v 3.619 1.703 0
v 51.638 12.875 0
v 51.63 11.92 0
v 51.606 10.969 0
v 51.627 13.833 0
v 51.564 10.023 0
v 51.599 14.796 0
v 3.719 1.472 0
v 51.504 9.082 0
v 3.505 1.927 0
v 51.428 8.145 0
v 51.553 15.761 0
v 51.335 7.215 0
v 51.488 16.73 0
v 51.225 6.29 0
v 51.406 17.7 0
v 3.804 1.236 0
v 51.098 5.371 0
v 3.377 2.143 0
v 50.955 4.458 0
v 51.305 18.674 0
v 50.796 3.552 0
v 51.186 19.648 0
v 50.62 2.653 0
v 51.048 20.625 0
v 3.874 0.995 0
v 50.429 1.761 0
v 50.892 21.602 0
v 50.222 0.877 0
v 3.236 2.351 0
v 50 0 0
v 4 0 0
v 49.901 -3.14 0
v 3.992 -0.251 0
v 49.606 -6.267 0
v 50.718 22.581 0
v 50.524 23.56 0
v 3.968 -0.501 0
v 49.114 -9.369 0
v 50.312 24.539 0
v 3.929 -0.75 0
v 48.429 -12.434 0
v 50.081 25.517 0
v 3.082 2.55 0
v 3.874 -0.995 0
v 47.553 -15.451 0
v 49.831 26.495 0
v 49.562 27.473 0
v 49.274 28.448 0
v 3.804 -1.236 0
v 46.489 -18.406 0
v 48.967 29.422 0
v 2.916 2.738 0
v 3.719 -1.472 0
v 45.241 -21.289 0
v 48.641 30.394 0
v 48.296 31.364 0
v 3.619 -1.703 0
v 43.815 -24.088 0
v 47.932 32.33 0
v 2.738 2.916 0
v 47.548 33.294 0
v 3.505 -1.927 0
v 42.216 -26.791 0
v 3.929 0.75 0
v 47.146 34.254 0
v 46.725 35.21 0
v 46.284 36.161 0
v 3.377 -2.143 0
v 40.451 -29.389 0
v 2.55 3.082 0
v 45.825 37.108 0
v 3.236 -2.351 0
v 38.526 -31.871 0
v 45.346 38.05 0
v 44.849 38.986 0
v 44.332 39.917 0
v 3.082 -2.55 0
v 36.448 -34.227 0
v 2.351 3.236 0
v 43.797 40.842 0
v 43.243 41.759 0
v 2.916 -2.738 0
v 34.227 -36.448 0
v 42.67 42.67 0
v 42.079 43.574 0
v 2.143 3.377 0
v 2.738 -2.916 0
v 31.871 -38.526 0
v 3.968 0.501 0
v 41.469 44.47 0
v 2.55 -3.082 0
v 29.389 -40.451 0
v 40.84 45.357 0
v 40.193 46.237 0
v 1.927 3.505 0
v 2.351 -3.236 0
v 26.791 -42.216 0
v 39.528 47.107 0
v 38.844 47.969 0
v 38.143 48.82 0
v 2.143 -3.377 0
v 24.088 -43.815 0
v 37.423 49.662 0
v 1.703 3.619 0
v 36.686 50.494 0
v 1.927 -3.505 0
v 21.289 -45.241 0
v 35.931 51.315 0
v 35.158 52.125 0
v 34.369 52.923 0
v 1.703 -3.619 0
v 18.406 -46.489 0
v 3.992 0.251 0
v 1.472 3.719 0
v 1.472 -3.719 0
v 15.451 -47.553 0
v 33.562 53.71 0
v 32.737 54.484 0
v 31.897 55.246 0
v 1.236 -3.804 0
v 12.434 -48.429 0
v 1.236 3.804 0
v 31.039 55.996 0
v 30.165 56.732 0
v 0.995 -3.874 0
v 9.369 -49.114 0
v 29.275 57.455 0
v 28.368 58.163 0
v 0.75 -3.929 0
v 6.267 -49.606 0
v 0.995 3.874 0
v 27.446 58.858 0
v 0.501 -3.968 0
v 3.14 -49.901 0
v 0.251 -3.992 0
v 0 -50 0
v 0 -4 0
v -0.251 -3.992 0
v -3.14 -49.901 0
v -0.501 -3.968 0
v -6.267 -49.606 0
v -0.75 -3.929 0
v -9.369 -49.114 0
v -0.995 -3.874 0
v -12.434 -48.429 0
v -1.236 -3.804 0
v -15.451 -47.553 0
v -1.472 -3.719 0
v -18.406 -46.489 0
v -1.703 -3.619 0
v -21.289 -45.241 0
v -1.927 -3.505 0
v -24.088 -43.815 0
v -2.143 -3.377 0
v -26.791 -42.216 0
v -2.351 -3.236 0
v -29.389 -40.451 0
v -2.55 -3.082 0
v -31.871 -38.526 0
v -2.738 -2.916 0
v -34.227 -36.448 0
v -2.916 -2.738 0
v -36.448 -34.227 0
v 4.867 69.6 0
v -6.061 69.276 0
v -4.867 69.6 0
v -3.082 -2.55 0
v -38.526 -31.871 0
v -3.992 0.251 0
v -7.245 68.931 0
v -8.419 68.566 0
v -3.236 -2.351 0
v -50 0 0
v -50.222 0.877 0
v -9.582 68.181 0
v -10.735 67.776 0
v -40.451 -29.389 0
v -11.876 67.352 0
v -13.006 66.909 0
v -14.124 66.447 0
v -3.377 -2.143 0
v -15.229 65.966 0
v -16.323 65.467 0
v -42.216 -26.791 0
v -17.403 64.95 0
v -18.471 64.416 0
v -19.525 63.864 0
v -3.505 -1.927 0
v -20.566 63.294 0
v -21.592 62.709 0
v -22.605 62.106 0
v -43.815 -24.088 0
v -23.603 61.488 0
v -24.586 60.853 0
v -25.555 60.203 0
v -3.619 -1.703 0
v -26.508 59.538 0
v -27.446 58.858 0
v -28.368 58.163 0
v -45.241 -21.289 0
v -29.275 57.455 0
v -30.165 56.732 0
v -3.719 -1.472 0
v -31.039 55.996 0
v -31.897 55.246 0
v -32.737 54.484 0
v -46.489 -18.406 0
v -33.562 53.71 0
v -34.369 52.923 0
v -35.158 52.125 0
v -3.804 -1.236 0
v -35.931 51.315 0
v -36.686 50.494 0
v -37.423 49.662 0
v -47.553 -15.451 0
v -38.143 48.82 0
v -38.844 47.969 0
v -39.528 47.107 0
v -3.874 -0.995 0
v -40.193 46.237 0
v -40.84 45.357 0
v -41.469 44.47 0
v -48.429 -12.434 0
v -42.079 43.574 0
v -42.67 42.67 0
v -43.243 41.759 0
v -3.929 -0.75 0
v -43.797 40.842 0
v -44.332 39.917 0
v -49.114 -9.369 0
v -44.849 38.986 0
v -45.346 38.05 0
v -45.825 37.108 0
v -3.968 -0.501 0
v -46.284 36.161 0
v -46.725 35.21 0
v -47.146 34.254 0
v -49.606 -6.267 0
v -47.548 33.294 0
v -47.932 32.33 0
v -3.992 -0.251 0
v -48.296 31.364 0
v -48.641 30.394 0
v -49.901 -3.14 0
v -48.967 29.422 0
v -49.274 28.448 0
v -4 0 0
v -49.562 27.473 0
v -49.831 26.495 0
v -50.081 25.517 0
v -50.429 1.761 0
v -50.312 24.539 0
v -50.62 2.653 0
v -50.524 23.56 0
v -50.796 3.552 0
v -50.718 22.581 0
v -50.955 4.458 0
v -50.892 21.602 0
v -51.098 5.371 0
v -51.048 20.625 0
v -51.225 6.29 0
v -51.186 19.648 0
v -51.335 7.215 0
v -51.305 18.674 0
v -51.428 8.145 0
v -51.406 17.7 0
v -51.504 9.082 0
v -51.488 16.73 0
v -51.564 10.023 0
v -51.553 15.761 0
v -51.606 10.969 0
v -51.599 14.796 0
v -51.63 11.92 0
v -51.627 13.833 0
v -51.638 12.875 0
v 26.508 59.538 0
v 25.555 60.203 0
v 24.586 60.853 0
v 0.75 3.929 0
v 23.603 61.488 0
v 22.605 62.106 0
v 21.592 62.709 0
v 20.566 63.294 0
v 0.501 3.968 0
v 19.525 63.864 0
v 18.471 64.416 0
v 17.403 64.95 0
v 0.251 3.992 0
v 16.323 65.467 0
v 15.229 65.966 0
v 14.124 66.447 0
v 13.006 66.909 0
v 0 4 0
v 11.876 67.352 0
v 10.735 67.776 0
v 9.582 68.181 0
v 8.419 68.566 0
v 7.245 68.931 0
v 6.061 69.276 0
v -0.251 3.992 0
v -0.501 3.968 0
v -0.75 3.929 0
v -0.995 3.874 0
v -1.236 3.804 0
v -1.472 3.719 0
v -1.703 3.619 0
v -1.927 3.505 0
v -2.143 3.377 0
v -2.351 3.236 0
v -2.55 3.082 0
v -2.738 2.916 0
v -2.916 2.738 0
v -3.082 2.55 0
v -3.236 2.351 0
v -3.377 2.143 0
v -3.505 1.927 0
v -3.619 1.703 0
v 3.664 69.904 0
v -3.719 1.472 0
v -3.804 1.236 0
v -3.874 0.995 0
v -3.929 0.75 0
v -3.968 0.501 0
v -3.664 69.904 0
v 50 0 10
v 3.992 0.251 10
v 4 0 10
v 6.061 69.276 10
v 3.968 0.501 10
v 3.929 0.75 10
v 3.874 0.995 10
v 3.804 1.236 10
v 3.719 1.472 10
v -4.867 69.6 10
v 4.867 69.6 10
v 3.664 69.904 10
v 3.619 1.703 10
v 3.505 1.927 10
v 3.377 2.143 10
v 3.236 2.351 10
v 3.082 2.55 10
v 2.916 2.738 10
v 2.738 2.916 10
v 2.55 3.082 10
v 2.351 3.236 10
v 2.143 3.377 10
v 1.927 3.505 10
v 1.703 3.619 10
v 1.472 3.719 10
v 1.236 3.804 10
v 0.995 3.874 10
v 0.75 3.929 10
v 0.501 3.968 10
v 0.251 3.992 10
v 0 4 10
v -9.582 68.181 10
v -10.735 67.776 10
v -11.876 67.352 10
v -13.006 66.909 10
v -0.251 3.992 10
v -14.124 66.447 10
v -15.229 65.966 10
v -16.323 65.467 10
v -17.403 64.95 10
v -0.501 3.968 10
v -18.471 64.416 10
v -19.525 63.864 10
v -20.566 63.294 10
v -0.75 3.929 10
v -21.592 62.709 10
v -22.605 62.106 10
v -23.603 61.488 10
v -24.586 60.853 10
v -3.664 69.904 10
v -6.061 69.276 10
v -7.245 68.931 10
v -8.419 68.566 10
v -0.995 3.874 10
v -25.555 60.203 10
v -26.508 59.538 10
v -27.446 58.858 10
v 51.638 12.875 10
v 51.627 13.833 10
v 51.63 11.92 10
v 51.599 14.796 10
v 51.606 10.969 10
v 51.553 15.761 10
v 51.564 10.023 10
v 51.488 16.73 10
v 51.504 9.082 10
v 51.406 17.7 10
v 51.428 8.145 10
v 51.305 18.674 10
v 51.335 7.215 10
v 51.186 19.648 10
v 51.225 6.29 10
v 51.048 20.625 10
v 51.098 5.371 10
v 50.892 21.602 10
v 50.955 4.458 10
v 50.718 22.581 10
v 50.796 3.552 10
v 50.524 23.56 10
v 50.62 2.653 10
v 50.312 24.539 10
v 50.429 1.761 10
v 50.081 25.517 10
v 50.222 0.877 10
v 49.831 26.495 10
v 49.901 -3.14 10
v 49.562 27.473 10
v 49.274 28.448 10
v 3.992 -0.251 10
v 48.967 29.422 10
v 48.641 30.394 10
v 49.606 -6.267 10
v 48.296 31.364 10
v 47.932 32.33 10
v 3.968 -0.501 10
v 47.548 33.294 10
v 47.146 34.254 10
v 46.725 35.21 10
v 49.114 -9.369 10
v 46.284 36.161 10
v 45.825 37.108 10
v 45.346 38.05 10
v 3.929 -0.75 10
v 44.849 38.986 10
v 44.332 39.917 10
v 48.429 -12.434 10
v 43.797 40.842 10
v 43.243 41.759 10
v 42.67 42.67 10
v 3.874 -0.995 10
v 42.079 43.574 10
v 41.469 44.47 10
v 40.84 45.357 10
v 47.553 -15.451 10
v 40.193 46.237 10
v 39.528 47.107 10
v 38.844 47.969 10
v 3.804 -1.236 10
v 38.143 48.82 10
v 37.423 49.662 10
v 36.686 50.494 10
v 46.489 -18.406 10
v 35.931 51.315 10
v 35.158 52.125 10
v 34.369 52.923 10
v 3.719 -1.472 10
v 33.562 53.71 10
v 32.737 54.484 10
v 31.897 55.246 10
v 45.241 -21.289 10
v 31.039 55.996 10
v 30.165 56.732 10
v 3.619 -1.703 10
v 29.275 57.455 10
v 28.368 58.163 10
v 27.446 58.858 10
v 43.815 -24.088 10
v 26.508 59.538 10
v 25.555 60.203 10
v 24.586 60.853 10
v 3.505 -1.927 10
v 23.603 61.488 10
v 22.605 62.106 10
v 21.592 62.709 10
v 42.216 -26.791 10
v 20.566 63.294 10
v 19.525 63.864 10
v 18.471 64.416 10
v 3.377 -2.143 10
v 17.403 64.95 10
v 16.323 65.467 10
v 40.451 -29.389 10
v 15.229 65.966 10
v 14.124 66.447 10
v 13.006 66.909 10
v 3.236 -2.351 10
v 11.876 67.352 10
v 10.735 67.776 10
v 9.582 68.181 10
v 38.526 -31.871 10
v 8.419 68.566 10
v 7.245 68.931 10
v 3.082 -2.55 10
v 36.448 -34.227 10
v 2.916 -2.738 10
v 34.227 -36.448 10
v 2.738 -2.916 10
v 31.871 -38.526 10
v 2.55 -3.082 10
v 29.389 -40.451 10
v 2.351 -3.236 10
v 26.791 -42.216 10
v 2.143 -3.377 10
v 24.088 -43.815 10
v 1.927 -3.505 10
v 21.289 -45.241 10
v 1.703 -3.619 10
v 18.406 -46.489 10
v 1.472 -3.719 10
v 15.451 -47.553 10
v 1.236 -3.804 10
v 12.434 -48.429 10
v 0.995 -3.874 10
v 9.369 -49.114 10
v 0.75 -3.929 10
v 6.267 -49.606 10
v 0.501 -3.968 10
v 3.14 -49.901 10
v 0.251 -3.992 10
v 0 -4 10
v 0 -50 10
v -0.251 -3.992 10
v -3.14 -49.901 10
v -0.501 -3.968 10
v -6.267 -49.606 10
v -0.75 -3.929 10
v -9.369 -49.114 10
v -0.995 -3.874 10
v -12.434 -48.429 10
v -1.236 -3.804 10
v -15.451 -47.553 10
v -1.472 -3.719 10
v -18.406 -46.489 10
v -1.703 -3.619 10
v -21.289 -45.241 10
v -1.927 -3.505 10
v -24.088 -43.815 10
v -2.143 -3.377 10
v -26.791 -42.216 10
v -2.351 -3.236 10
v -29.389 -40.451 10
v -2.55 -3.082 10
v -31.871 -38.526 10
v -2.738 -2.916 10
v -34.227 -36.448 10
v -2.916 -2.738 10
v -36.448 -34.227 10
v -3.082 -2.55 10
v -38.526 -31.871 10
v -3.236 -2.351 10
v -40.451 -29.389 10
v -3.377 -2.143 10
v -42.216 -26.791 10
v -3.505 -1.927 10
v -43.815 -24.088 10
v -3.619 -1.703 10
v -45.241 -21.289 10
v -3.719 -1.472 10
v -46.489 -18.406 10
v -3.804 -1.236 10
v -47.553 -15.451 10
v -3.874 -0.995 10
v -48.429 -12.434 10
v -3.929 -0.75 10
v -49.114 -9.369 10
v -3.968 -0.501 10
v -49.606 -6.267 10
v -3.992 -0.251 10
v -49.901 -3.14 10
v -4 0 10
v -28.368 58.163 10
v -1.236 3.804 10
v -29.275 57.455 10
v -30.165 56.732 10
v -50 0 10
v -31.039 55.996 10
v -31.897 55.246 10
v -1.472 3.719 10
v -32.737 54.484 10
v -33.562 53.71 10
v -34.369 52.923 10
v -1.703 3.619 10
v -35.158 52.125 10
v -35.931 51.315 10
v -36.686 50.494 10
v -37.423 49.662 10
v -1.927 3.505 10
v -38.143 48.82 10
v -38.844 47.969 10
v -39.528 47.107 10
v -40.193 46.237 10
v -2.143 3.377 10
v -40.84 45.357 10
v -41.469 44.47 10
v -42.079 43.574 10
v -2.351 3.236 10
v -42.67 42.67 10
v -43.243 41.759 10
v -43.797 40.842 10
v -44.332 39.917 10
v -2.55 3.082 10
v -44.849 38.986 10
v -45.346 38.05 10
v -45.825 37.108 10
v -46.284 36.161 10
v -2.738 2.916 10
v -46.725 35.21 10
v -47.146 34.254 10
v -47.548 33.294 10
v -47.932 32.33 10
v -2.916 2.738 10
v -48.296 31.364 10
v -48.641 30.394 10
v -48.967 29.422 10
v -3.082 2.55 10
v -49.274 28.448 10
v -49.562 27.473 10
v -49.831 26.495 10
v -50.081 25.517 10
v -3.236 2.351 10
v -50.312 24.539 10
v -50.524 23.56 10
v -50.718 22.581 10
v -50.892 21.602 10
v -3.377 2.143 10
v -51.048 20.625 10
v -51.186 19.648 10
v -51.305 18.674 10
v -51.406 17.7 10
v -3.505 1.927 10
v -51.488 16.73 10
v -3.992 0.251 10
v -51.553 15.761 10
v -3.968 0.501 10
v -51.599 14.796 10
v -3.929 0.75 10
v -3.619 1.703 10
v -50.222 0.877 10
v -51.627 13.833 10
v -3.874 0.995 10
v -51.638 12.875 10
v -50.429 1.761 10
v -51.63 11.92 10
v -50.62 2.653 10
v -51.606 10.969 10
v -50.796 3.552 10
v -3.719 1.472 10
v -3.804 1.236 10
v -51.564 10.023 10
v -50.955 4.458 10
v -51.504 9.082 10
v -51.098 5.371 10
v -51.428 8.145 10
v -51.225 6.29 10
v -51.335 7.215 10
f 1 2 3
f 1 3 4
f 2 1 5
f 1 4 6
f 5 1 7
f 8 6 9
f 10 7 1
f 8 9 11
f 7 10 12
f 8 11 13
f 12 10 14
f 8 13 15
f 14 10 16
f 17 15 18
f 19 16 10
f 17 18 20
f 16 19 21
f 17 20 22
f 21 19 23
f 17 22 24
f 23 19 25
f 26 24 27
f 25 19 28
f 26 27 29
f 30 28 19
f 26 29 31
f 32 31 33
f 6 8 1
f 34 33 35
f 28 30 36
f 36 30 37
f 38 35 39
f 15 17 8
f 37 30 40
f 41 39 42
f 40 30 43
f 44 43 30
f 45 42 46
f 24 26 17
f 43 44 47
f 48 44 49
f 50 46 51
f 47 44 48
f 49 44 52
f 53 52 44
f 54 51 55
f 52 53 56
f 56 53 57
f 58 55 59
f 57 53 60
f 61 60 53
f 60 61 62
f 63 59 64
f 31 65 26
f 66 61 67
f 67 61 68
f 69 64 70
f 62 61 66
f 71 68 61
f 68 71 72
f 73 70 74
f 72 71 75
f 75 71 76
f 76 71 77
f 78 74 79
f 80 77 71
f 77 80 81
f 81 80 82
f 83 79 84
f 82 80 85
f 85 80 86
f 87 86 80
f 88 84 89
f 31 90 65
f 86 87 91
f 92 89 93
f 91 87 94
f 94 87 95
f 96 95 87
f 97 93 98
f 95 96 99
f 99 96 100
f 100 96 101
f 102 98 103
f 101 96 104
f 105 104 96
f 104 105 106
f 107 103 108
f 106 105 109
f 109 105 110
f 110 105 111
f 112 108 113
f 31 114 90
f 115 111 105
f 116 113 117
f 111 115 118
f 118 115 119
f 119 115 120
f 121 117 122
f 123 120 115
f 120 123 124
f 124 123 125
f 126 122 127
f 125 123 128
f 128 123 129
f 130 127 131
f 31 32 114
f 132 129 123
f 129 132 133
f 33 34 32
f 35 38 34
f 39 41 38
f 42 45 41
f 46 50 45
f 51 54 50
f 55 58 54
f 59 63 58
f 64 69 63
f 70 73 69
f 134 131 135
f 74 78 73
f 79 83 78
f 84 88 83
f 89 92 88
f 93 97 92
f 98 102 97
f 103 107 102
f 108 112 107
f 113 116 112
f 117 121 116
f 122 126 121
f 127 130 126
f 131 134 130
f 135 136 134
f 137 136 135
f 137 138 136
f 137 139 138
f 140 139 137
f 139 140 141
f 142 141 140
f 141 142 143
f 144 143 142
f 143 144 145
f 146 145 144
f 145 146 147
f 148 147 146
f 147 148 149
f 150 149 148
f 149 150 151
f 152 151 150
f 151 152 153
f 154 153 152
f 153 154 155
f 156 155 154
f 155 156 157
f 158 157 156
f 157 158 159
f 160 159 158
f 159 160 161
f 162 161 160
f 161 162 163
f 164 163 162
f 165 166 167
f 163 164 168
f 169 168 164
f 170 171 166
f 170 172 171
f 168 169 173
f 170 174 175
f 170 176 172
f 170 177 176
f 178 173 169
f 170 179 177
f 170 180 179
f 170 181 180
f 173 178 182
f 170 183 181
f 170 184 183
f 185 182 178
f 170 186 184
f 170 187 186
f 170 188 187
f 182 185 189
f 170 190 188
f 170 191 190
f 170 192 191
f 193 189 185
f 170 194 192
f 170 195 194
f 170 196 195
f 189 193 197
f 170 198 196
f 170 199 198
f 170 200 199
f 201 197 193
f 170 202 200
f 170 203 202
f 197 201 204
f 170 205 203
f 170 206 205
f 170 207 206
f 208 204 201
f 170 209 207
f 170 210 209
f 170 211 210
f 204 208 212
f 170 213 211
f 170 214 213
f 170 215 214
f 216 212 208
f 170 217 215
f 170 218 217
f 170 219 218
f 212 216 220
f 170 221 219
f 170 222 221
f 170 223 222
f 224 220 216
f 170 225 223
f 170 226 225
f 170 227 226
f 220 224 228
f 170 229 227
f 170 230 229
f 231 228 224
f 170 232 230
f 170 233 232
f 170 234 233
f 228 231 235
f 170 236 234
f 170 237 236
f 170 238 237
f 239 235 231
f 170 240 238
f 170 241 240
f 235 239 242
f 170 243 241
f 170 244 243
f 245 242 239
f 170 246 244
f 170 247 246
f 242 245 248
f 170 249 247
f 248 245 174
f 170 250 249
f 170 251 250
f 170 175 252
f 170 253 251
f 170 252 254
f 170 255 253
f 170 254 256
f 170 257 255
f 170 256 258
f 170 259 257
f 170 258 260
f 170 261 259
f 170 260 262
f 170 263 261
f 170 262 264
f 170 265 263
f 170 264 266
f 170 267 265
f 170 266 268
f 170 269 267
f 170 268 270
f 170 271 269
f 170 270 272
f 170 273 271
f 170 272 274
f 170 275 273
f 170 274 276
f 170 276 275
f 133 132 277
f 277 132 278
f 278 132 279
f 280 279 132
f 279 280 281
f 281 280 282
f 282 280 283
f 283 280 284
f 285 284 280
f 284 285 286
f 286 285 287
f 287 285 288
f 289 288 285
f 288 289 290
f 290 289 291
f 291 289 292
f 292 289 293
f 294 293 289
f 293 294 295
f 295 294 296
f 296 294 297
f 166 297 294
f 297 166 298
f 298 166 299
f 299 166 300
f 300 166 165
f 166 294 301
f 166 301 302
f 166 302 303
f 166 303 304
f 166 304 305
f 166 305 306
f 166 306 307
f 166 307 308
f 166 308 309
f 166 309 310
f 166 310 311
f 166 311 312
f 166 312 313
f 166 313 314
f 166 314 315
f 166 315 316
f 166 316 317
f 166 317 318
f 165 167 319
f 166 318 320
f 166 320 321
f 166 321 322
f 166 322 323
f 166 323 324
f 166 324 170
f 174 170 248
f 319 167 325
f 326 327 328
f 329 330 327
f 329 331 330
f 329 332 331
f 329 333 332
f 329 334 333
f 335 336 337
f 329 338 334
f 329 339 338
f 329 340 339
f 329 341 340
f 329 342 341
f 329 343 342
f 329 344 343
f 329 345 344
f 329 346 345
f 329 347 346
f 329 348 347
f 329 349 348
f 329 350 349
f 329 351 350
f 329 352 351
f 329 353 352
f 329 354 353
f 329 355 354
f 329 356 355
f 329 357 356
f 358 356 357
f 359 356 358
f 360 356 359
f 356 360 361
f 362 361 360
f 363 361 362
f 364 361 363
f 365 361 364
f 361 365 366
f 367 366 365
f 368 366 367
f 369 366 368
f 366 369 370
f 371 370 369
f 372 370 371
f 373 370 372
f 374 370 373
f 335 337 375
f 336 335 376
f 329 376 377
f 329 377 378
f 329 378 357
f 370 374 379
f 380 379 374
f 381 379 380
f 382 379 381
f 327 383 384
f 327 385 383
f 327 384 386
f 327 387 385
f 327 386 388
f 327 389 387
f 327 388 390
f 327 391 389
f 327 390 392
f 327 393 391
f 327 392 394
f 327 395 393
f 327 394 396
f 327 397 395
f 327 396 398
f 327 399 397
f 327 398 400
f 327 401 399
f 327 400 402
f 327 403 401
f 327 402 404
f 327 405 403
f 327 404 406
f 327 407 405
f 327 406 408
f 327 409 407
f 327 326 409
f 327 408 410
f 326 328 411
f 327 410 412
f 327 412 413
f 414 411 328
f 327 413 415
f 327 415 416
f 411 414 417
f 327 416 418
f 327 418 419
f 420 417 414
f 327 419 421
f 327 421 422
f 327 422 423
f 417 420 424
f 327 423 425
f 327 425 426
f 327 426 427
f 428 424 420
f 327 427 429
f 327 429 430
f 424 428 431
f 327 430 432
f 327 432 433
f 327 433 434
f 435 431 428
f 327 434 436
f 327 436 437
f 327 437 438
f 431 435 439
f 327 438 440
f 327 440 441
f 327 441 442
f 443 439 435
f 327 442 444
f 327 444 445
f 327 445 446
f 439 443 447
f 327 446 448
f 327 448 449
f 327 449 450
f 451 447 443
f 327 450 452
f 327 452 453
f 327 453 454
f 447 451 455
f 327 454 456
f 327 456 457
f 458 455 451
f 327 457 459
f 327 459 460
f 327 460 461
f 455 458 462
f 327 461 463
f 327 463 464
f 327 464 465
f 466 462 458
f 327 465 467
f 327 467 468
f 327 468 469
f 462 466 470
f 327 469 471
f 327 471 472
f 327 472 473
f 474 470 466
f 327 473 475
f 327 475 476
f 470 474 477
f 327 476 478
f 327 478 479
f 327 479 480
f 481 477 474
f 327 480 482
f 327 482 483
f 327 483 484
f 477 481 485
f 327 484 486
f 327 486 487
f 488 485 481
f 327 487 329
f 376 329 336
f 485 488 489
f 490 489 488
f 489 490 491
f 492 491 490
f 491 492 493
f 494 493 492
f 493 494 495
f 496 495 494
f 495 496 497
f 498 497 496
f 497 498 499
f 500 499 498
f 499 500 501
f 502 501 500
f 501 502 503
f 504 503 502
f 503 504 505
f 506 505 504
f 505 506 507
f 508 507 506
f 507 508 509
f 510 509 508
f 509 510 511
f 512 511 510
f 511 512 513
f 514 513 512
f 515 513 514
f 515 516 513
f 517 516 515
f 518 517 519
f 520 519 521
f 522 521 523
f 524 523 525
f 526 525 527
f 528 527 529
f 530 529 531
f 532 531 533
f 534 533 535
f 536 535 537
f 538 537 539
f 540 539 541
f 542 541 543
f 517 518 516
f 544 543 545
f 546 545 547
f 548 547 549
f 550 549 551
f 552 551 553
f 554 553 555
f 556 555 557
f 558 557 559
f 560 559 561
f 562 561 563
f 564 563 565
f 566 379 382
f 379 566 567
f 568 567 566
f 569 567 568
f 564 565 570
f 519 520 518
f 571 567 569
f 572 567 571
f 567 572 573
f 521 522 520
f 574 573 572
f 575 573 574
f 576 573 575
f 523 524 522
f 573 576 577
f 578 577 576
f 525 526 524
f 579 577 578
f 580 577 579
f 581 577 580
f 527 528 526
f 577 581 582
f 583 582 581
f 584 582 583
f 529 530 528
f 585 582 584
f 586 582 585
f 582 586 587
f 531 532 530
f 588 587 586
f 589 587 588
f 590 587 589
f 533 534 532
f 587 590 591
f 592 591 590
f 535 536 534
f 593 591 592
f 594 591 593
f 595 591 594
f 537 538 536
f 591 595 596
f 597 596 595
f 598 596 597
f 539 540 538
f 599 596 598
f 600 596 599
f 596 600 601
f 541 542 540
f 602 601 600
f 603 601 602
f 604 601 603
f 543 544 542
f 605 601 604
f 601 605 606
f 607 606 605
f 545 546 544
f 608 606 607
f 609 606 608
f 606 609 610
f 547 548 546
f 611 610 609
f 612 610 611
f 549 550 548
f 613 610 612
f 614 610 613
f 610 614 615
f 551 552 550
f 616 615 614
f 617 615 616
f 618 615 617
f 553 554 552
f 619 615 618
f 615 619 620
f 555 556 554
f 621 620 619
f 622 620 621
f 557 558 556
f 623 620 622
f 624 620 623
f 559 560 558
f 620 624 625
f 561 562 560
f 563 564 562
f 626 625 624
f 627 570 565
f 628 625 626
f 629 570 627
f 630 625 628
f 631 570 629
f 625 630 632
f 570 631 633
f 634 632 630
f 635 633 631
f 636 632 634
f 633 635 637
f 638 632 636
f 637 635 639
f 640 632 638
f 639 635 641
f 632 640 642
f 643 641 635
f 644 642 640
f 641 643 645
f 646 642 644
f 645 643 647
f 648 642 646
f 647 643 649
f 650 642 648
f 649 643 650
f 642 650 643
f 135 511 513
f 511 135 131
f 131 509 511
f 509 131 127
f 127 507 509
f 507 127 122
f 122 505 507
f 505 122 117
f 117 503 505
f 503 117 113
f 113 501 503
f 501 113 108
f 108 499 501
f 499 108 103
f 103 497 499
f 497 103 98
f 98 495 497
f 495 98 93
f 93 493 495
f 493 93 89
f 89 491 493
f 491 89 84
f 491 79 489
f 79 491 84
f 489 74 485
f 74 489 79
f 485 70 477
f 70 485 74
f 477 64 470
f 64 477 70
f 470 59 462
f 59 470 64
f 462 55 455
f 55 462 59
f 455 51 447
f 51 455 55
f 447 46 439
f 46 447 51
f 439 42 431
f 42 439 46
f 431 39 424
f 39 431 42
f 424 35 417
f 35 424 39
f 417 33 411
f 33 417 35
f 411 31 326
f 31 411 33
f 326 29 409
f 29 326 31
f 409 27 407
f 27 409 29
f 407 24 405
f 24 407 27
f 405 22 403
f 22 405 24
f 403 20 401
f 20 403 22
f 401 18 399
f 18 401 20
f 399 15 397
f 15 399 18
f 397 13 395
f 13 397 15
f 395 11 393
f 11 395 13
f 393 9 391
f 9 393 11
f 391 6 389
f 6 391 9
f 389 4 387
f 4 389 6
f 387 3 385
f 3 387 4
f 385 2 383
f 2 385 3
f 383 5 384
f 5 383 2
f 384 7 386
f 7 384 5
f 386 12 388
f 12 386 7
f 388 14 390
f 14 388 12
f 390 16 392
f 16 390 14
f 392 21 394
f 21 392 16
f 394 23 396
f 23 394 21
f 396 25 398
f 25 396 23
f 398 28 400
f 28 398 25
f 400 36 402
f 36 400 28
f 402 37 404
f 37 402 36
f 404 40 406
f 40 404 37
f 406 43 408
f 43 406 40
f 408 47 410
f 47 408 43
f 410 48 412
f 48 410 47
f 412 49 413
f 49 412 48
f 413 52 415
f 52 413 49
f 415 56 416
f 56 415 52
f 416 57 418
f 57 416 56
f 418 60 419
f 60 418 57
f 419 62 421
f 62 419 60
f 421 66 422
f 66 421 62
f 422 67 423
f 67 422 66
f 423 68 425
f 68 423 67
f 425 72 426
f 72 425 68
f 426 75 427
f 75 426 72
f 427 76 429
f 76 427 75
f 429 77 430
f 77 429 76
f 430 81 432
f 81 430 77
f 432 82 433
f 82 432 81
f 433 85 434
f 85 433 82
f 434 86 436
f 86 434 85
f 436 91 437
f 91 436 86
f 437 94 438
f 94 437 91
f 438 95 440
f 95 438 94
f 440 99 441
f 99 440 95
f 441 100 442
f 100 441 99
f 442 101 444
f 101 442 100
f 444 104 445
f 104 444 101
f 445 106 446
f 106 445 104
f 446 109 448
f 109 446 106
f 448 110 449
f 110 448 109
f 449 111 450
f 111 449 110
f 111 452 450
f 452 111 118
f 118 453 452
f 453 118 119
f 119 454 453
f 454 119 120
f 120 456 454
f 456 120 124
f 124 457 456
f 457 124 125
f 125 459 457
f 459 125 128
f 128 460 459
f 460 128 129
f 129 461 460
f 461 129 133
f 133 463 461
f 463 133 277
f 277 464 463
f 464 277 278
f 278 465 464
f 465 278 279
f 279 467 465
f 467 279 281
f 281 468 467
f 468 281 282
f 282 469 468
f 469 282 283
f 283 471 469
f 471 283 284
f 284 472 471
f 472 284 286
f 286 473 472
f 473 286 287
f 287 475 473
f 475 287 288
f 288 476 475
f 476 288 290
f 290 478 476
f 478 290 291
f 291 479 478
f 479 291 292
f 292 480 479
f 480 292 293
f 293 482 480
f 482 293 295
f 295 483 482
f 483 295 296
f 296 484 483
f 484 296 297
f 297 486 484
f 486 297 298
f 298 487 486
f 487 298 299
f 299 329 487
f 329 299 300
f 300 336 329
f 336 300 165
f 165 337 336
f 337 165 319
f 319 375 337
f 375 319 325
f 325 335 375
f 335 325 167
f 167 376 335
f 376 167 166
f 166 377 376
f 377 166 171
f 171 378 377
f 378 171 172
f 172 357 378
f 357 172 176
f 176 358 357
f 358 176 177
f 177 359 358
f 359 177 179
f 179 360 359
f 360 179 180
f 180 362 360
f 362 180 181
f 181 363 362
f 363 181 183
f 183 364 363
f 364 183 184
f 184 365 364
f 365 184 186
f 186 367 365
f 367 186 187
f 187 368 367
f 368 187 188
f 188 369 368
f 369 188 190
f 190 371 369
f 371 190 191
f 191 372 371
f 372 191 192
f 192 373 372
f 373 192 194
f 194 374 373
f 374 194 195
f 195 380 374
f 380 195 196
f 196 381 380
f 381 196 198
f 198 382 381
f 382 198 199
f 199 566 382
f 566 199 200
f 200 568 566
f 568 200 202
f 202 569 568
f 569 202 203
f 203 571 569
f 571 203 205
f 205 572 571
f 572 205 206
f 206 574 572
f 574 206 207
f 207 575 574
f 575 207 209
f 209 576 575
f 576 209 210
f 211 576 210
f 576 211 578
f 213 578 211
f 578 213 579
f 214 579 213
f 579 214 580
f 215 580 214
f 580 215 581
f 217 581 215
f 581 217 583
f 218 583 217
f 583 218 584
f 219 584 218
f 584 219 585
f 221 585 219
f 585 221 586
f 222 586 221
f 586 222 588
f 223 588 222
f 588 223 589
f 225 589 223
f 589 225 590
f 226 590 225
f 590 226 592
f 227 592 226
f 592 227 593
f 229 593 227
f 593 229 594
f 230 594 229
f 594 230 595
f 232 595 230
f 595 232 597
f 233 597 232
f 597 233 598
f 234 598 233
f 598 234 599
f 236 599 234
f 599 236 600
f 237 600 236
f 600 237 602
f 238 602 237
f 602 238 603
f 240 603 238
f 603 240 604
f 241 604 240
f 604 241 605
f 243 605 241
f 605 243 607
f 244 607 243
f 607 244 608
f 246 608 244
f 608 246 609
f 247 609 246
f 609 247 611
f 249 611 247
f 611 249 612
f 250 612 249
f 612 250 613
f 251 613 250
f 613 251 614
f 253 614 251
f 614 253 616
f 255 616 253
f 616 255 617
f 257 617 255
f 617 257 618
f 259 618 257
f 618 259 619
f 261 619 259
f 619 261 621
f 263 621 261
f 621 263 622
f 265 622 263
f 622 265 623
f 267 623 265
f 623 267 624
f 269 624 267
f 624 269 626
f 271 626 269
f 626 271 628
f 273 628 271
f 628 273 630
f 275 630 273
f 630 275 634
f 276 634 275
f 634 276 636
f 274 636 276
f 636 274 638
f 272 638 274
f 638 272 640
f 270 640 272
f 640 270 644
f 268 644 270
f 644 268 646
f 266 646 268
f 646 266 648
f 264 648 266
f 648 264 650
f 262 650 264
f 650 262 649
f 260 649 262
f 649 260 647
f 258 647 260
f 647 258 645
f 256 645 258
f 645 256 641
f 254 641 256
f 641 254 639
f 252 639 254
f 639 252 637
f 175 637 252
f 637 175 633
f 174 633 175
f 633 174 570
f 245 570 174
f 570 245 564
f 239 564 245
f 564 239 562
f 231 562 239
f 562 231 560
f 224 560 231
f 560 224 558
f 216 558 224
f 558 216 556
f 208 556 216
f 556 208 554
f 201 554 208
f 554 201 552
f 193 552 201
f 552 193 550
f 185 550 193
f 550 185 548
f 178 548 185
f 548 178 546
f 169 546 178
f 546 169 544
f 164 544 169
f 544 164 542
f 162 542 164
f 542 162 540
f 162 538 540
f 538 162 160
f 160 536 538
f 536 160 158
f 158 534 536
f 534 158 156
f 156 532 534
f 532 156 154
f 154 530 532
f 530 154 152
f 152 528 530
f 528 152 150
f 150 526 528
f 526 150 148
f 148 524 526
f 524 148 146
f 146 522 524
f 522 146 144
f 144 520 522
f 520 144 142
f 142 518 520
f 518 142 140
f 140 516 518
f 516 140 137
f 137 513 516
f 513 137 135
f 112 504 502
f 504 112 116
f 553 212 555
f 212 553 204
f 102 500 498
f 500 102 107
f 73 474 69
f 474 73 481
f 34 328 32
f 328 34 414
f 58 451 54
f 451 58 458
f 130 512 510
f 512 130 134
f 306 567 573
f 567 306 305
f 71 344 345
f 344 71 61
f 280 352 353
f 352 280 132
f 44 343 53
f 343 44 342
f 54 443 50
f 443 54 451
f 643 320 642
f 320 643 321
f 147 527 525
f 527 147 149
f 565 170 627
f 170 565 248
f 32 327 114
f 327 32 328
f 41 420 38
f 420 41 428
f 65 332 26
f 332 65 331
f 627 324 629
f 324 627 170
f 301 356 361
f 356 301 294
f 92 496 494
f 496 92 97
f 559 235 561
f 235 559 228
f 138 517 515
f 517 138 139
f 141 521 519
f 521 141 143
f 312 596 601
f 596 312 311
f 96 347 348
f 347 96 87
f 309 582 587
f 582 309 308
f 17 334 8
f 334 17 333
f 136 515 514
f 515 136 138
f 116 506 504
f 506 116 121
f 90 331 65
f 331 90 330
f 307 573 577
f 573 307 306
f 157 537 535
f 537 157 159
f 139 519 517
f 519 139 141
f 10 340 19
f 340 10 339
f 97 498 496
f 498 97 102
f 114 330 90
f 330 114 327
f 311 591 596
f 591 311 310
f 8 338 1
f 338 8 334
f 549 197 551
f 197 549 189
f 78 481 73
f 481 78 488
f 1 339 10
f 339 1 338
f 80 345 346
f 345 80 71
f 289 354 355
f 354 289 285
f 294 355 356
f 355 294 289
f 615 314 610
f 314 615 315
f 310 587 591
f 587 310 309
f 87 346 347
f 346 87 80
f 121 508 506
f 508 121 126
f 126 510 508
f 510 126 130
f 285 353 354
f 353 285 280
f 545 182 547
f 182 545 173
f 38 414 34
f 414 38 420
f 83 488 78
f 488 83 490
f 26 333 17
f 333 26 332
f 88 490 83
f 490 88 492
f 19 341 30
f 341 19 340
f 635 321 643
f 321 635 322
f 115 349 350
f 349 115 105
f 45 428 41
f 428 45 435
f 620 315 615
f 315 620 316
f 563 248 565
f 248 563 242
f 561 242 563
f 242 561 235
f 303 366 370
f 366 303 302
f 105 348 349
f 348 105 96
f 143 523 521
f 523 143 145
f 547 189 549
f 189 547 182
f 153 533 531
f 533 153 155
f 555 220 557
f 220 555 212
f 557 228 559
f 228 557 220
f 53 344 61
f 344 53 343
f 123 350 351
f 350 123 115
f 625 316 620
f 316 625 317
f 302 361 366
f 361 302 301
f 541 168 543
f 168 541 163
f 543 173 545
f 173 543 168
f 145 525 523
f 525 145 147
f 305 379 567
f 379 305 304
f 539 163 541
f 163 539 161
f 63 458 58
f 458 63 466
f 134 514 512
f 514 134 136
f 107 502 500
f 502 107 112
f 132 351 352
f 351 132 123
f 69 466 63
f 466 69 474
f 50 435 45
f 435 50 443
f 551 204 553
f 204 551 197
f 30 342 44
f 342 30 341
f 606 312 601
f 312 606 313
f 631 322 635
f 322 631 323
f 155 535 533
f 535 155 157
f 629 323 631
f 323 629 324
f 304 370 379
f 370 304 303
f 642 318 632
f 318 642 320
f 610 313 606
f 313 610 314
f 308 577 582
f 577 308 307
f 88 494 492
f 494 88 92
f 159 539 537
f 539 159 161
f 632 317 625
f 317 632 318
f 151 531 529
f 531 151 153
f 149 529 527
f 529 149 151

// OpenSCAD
$fn=100;

total_lift              = 20;   // mm
base_circle_diameter    = 100;  // mm
bottom_dwell_begin      = 0;    // degrees
bottom_dwell_end        = 180;  //degree
rise_begin              = 180;  //degree
rise_end                = 267;  //degree
top_dwell_begin         = 267;  //degree
top_dwell_end           = 273;  //degree
fall_begin              = 273;  //degree
fall_end                = 360;  //degree

rise    = rise_end - rise_begin;
fall    = fall_end - fall_begin;

function tan_theta(base) = total_lift/base;
function height(angle, base) = base_circle_diameter/2+angle*tan_theta(base);
function x(angle, base) = cos(angle)*height(angle, base);
function y(angle, base) = sin(angle)*height(angle, base);






points_rise = [ for ( angle = [0 : rise]) [x(angle, rise), y(angle, rise)] ];
points_fall = [ for ( angle = [fall : -1 : 0]) [-x(angle, fall), y(angle, fall)] ];
    
points = concat( points_rise, points_fall );

echo(points);

difference()
{
    linear_extrude(10)
    {
        union()
            {
            polygon(points);
            circle(base_circle_diameter/2);
            }
    }
    cylinder(h=10, d=8);
}
